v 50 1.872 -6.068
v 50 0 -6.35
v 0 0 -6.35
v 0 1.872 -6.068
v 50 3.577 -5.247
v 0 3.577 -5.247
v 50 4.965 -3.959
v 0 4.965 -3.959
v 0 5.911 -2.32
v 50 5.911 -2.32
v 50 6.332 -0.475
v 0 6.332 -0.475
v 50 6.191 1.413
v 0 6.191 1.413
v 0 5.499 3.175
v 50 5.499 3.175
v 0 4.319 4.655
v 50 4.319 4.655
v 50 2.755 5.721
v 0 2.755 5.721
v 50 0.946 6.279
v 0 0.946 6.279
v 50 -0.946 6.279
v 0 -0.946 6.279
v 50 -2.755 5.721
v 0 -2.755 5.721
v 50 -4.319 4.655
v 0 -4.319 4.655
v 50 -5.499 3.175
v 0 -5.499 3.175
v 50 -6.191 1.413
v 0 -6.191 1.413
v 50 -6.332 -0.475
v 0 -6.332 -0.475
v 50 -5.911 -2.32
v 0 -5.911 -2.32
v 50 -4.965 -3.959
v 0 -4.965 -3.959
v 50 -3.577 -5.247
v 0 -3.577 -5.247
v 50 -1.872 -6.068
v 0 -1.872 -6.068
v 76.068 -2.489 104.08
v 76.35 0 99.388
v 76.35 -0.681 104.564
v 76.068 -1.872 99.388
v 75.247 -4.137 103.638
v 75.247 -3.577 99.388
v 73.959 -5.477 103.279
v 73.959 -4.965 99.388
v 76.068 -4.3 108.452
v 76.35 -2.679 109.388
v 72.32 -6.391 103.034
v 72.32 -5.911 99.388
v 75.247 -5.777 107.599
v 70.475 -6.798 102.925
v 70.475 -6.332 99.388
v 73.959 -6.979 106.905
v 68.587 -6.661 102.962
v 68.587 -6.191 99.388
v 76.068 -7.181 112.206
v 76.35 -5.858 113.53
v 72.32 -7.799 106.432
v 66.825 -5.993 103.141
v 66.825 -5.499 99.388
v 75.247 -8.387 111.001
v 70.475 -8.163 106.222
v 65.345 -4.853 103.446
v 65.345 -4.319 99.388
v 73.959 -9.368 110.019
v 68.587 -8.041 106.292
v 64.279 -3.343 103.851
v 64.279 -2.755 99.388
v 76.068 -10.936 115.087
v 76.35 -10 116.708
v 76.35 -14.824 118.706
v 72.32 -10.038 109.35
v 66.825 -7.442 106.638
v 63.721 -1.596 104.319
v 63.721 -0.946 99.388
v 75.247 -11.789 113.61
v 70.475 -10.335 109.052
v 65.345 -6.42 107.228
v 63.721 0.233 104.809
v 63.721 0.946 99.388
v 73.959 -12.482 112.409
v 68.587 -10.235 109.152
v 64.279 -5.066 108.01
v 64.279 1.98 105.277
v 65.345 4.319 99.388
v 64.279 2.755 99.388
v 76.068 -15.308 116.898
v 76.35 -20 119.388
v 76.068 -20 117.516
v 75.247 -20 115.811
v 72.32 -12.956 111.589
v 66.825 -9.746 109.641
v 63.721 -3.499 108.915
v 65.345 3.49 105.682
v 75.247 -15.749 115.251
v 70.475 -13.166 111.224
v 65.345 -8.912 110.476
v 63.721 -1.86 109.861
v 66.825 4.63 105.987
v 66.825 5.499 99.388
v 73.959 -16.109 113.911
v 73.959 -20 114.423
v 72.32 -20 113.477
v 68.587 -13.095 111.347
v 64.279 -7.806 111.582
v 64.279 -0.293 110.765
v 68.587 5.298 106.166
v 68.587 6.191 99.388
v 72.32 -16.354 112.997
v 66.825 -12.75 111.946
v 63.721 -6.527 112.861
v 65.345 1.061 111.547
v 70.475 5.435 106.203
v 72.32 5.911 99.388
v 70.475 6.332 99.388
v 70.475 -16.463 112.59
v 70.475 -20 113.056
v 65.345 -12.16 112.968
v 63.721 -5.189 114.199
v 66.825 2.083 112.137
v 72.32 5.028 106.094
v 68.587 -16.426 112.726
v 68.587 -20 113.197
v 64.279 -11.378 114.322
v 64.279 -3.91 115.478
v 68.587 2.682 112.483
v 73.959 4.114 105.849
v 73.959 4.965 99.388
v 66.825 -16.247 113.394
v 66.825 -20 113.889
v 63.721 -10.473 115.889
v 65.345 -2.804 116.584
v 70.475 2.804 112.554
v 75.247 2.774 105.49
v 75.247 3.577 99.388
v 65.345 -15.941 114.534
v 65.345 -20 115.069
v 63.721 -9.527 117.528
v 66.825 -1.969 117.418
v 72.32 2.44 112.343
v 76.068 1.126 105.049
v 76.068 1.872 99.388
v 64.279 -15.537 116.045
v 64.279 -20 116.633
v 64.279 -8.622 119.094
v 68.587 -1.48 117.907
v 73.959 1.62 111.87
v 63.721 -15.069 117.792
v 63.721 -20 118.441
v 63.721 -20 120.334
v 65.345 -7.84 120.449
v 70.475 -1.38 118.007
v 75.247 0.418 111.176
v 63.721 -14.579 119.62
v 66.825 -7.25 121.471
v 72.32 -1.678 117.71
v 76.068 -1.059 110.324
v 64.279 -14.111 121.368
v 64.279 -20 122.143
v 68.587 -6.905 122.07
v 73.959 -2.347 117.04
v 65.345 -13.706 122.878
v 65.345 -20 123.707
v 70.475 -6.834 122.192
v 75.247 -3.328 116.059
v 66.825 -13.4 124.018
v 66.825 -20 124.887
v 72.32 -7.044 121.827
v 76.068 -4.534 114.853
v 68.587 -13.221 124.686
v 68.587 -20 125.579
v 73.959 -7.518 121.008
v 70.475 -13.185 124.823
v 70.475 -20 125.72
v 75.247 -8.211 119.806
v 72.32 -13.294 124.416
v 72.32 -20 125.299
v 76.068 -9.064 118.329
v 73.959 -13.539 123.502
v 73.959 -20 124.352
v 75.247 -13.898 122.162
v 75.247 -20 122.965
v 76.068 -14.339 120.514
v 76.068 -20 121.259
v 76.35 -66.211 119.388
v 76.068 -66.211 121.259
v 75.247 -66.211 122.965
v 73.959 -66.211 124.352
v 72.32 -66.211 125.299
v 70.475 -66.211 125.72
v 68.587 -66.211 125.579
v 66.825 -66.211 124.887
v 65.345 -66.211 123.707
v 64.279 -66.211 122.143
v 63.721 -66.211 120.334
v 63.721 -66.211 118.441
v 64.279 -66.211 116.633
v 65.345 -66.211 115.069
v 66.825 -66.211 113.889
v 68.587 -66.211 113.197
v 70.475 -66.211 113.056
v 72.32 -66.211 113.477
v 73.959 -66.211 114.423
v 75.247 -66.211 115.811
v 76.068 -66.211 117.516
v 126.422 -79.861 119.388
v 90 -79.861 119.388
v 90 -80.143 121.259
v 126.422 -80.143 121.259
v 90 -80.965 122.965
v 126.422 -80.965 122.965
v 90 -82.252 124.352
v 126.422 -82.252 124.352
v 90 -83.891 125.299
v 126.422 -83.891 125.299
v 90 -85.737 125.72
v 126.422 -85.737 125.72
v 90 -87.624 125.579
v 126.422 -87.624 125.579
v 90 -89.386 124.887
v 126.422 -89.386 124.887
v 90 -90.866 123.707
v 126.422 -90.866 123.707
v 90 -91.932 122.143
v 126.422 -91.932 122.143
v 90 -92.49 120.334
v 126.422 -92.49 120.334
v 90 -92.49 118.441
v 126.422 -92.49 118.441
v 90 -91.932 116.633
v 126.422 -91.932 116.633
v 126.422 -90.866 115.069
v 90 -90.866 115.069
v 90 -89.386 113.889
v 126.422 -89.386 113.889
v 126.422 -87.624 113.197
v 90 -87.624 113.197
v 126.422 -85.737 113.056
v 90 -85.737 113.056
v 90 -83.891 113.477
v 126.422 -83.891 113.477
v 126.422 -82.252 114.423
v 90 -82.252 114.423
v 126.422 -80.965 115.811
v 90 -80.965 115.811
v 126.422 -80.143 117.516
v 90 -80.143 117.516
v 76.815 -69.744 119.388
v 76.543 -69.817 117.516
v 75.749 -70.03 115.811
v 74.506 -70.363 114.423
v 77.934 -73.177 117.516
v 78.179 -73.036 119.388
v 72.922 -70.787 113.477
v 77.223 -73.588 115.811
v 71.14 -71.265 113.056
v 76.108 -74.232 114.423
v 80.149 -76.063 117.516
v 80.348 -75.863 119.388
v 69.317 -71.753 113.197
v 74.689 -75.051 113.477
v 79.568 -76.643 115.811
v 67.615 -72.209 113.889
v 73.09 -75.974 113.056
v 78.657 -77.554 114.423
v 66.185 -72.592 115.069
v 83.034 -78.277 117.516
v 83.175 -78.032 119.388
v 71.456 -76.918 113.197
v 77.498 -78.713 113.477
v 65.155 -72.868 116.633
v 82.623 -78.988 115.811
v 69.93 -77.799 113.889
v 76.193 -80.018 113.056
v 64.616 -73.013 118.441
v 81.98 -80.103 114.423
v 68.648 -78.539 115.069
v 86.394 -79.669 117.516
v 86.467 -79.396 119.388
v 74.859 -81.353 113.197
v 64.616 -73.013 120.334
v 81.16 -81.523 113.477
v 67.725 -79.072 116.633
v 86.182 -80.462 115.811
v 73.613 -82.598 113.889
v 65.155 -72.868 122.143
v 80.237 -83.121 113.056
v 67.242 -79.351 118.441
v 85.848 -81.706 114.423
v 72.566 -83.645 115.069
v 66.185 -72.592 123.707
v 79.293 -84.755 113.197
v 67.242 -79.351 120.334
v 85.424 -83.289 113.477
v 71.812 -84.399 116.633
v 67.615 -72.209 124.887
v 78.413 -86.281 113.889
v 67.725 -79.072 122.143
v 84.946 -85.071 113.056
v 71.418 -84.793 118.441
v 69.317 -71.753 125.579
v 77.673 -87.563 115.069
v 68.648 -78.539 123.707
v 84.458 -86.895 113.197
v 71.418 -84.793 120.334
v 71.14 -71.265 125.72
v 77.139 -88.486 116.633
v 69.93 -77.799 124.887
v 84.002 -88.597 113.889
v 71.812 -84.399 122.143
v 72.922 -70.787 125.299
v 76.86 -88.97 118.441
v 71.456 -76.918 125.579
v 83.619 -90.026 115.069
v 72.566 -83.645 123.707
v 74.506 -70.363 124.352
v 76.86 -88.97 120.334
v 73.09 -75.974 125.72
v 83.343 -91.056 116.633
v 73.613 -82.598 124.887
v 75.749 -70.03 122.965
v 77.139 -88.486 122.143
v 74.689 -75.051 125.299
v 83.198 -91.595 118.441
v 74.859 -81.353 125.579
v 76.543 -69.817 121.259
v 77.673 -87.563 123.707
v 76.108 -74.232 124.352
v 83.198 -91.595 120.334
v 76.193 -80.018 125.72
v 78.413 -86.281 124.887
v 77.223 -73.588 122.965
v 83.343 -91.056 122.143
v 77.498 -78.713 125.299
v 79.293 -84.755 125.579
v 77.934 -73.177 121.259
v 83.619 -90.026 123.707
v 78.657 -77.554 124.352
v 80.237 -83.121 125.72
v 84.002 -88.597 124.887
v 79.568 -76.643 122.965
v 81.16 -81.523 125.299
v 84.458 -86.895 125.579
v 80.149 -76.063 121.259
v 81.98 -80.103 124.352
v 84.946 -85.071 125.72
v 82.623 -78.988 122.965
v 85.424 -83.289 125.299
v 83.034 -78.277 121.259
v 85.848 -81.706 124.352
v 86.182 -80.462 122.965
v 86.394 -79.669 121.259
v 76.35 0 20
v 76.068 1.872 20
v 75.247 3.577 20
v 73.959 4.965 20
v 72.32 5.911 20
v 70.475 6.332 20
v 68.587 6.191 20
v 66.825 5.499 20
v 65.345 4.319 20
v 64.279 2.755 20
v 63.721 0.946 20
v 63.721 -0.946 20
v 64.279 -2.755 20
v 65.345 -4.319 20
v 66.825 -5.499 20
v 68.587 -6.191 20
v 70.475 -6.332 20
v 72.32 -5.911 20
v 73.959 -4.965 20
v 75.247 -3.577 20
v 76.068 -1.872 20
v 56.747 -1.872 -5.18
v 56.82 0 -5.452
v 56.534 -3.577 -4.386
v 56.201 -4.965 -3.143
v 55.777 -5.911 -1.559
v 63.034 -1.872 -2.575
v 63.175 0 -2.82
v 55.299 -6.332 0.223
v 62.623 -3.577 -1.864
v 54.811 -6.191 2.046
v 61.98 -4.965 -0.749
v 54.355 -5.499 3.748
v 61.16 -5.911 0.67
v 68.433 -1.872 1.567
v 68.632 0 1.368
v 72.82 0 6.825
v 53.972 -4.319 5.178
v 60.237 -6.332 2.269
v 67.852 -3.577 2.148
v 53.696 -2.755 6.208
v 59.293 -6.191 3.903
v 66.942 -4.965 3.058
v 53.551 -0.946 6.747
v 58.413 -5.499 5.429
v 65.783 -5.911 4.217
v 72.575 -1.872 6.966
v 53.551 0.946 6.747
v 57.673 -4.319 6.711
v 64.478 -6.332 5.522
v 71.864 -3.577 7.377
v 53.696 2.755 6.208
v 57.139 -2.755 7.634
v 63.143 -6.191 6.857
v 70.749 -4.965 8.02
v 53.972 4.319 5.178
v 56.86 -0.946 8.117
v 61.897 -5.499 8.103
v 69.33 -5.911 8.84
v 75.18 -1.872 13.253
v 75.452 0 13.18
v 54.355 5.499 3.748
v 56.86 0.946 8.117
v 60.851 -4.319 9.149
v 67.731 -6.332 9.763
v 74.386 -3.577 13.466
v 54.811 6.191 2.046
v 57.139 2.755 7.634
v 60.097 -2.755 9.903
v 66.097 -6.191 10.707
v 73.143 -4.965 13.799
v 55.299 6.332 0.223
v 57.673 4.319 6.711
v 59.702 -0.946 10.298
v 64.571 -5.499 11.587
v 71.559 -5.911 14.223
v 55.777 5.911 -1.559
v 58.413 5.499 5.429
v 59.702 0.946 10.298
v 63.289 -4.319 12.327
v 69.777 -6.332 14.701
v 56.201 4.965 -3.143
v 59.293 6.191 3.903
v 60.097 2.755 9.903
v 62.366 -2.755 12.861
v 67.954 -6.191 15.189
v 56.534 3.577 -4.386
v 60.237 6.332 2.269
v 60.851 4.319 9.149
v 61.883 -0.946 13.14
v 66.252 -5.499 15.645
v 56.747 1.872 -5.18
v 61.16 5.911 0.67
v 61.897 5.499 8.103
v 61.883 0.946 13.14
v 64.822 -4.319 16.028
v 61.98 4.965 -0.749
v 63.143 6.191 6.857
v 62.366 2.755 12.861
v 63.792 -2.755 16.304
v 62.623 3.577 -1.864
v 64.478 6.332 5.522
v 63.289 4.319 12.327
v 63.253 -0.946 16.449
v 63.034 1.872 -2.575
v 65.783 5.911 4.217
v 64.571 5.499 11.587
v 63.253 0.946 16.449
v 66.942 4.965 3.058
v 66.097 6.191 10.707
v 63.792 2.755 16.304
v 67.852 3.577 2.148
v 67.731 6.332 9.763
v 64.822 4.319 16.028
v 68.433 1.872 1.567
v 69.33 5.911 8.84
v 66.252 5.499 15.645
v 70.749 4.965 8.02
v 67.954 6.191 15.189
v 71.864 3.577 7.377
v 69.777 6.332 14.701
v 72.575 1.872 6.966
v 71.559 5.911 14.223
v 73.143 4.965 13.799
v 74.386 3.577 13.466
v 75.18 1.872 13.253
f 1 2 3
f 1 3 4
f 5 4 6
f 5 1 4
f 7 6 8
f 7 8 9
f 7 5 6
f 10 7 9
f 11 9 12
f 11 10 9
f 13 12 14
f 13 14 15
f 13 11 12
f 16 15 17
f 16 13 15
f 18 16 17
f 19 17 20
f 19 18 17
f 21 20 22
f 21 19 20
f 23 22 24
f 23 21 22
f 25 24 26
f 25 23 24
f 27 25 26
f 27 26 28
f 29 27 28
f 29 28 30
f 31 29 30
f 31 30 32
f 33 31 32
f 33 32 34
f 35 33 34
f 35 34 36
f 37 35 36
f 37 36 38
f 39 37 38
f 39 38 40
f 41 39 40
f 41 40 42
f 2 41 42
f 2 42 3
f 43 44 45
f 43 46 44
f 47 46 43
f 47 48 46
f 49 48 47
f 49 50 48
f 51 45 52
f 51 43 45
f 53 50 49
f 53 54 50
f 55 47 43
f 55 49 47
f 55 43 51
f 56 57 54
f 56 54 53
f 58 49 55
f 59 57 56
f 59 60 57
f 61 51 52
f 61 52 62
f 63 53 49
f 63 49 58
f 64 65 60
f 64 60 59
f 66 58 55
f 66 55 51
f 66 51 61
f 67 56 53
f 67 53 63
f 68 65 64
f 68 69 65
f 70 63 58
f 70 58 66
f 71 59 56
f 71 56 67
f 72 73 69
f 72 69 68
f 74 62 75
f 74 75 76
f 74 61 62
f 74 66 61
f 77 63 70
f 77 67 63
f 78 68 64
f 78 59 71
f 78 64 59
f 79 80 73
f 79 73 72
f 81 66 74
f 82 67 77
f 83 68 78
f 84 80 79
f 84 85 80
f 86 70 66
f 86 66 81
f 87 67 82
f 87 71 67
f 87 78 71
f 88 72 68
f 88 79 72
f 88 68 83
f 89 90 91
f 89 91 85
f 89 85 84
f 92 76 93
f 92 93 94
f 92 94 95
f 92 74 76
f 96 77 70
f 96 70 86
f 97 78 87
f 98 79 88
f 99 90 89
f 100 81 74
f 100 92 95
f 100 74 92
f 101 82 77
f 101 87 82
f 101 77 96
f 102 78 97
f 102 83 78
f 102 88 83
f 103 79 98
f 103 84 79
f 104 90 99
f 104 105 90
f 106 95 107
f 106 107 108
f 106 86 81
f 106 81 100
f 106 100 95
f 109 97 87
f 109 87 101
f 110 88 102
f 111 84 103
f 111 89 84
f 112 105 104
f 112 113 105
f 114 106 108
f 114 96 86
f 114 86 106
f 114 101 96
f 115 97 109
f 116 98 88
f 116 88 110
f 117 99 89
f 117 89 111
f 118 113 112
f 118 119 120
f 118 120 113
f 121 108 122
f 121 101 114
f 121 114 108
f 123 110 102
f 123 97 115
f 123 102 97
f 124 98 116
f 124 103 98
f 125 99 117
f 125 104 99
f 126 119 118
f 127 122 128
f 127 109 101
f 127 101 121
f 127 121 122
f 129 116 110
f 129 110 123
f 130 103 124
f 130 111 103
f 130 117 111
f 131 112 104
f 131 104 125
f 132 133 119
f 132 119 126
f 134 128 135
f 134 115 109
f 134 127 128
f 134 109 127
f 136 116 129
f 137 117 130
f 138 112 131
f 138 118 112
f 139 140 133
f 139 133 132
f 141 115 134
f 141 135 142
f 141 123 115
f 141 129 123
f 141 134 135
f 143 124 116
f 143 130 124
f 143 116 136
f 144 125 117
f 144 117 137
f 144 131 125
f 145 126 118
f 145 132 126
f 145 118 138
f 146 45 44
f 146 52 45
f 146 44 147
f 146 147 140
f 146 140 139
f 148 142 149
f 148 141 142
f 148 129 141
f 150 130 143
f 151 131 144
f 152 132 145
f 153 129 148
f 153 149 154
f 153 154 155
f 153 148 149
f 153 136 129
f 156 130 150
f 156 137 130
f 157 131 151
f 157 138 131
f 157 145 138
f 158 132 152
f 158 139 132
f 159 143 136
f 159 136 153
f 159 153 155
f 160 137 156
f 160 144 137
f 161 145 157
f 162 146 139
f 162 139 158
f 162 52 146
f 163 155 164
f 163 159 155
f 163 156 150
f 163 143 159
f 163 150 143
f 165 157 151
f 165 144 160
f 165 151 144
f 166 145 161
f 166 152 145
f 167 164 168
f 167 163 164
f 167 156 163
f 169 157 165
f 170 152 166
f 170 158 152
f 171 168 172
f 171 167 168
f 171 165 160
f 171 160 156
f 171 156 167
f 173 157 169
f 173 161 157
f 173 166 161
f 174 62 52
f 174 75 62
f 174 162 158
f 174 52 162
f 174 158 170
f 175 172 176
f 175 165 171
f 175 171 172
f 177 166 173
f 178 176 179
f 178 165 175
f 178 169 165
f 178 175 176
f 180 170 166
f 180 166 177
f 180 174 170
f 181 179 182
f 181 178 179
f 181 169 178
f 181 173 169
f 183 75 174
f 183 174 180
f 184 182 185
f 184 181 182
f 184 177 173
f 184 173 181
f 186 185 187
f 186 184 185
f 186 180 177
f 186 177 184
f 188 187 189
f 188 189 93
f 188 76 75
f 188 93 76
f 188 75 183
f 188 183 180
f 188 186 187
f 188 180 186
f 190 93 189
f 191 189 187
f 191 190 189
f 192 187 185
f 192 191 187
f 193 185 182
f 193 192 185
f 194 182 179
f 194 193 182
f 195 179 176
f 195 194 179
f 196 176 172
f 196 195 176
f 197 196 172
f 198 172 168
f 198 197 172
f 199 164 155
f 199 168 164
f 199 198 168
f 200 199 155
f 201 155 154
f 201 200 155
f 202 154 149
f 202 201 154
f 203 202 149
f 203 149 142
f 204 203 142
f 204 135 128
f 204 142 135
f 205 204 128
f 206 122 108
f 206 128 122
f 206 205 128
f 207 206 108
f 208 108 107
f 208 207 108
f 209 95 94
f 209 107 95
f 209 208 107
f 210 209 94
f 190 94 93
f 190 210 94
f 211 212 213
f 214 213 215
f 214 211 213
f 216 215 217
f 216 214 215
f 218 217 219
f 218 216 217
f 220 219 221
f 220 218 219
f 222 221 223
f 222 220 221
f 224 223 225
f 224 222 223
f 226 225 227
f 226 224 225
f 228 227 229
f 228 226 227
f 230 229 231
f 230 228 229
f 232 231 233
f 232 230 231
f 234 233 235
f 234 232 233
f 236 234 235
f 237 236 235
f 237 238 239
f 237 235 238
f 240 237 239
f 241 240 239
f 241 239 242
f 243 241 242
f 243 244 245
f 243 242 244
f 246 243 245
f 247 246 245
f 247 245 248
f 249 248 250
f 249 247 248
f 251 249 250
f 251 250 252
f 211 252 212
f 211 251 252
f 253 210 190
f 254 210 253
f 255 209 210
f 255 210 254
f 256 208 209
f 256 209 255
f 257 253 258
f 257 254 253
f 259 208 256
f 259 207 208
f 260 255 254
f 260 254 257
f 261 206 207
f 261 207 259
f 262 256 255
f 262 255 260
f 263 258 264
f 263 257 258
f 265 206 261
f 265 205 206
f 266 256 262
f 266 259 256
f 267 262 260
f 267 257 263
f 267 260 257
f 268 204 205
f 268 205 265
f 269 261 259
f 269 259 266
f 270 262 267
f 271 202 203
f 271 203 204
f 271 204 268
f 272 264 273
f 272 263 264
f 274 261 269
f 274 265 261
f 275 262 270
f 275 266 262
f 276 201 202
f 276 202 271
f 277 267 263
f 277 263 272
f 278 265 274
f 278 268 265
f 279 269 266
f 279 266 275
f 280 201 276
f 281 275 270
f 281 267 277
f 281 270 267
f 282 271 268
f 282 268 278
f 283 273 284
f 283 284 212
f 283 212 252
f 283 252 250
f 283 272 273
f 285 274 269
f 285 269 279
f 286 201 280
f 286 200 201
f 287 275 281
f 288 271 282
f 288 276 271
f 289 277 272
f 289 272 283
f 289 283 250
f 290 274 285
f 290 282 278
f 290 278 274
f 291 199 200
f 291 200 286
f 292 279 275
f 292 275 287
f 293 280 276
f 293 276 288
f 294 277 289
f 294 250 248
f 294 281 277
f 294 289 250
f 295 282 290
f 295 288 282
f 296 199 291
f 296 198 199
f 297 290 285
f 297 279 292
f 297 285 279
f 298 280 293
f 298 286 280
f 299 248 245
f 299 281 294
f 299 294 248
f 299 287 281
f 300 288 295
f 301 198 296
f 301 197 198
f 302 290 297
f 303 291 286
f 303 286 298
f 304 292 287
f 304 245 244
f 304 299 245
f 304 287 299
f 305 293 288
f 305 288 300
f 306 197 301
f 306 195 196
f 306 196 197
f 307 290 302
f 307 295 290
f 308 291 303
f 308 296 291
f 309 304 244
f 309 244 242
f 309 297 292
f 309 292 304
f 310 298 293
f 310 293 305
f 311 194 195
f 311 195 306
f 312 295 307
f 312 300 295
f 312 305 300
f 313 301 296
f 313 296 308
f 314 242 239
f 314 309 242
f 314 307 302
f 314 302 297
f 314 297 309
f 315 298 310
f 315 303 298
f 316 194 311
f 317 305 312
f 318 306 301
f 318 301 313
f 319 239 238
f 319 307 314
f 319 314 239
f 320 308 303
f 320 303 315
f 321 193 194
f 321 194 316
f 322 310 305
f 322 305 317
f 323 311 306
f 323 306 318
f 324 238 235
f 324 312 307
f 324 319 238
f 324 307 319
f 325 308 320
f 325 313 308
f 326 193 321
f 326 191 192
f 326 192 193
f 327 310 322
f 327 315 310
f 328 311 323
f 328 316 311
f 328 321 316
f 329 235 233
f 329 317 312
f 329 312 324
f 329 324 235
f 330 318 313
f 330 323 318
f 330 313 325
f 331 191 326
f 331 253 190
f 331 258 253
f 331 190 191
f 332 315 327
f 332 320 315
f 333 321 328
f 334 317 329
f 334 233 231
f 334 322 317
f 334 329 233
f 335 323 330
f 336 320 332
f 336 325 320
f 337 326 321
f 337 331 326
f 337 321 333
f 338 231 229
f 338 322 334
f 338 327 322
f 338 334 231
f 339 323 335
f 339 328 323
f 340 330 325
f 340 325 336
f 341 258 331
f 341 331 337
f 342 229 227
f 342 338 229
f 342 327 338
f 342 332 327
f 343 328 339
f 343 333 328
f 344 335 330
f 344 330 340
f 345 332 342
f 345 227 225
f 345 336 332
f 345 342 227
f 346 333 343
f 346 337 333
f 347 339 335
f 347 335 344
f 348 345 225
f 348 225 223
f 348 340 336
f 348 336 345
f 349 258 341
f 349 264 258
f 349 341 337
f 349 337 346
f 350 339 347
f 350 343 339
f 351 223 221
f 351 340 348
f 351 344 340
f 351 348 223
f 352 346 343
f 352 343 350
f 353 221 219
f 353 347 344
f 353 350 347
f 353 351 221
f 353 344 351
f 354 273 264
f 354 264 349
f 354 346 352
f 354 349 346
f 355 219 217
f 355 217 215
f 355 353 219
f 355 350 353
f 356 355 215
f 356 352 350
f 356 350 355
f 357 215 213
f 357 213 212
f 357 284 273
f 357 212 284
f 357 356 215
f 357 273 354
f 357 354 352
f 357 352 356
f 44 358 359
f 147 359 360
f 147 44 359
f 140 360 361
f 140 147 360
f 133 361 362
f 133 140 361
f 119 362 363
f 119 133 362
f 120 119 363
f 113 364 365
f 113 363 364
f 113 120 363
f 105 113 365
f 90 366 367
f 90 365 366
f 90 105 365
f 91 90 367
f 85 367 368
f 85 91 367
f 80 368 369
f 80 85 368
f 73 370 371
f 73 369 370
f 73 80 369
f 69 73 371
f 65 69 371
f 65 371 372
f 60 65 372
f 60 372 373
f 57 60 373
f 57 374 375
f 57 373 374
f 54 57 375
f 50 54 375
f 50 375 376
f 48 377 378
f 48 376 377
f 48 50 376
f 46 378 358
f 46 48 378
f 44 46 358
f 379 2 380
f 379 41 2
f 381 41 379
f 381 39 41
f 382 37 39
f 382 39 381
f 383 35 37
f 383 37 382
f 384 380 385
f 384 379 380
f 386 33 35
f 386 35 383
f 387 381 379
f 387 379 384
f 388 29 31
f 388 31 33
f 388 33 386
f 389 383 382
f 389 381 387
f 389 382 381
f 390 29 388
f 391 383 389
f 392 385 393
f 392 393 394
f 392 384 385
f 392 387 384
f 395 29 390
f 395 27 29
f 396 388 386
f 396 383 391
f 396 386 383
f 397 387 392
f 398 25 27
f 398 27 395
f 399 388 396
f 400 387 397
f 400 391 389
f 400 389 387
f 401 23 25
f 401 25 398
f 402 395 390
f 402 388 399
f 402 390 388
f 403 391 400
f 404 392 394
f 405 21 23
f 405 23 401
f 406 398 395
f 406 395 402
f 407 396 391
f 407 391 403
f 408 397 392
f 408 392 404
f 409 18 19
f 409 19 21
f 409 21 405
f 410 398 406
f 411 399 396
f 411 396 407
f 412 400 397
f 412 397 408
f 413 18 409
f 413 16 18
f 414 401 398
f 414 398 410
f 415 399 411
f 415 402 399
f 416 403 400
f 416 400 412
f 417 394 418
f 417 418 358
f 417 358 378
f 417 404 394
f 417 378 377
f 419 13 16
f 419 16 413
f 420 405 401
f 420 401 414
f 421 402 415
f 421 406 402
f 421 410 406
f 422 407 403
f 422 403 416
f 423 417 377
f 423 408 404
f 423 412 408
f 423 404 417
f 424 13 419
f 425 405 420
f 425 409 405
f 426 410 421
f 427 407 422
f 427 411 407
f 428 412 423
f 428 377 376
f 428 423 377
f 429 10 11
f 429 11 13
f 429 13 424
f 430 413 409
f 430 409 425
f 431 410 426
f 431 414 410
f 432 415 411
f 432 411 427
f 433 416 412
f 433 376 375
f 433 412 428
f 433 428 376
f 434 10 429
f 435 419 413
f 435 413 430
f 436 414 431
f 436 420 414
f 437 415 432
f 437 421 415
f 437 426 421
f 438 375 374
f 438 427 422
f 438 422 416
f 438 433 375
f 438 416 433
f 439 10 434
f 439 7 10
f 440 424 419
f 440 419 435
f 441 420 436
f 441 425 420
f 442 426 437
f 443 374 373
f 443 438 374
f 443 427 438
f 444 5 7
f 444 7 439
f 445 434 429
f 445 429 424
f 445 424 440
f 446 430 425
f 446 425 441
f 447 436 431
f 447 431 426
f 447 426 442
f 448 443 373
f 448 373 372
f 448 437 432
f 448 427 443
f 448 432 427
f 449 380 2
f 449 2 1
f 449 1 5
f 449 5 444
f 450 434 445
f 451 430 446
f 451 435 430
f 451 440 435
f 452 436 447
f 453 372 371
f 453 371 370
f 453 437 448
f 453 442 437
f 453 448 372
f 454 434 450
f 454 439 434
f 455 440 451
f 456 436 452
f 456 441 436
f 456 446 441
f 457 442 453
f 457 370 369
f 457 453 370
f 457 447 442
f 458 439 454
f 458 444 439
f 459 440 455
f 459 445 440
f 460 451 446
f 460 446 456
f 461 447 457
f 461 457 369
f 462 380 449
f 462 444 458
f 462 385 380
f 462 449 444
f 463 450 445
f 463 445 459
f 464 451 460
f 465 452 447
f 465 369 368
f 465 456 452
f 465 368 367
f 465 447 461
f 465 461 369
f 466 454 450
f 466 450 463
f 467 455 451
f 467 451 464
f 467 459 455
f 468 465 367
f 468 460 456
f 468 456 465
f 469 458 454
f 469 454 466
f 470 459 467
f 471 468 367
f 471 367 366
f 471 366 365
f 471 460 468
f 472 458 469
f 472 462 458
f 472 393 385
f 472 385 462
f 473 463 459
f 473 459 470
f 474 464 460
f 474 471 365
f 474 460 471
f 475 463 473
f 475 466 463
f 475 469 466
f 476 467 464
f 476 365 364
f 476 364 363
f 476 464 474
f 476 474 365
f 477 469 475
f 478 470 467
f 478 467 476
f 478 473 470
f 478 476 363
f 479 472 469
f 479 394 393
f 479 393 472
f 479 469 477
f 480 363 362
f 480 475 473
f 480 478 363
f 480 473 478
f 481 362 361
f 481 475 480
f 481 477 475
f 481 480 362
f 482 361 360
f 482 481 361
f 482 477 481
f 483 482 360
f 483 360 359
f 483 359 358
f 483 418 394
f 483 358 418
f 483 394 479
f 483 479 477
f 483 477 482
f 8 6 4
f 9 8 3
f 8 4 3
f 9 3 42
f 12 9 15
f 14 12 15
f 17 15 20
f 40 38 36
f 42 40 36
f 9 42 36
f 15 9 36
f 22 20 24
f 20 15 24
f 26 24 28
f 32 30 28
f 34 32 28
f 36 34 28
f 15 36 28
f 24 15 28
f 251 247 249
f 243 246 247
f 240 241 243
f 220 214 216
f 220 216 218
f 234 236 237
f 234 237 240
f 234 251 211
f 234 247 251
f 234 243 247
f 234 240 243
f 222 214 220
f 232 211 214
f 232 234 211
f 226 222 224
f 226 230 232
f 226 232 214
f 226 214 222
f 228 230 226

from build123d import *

# Parameters (mm, degrees)
CROQUIS2_R = 6.35
CROQUIS7_R = 6.35
CROQUIS8_R = 6.35


with BuildPart() as part:
    # Barrer2: sweep along a path in Croquis1
    with BuildLine(Plane(origin=(0, 0, 0), x_dir=(1, 0, 0), z_dir=(0, 1, 0))) as barrer2_path:
        Line((0, 0), (50, 0))
        ThreePointArc((50, 0), (64.142135624, -5.857864376), (70, -20))
        Line((70, -20), (70, -70))
    # Croquis2 → Barrer2 (sweep)
    with BuildSketch(Plane(origin=(0, 0, 0), x_dir=(0, 0, -1), z_dir=(1, 0, 0))):
        Circle(CROQUIS2_R)
    sweep(path=barrer2_path.line)

    # Barrer3: sweep along a path in Croquis3
    with BuildLine(Plane(origin=(70, 0, 0), x_dir=(0, 0, -1), z_dir=(1, 0, 0))) as barrer3_path:
        Line((-70, 0), (-99.387787897, 0))
        ThreePointArc((-99.387787897, 0), (-113.529923521, -5.857864376), (-119.387787897, -20))
        Line((-119.387787897, -20), (-119.387787897, -40.166140684))
        Line((-119.387787897, -40.166140684), (-119.387787897, -49.955998728))
    # Croquis7 → Barrer3 (sweep)
    with BuildSketch(Plane.XY.offset(70)):
        with Locations((70, 0)):
            Circle(CROQUIS7_R)
    sweep(path=barrer3_path.line)

    # Barrer4: sweep along a path in Croquis5
    with BuildLine(Plane.XY.offset(119.387787897)) as barrer4_path:
        Line((70, -49.842890924), (70, -66.211244979))
        ThreePointArc((70, -66.211244979), (75.857864376, -80.353380602), (90, -86.211244979))
        Line((90, -86.211244979), (126.42207306, -86.211244979))
    # Croquis8 → Barrer4 (sweep)
    with BuildSketch(Plane.XZ.offset(49.955998728)):
        with Locations((70, 119.387787897)):
            Circle(CROQUIS8_R)
    sweep(path=barrer4_path.line)


solid = part.part
